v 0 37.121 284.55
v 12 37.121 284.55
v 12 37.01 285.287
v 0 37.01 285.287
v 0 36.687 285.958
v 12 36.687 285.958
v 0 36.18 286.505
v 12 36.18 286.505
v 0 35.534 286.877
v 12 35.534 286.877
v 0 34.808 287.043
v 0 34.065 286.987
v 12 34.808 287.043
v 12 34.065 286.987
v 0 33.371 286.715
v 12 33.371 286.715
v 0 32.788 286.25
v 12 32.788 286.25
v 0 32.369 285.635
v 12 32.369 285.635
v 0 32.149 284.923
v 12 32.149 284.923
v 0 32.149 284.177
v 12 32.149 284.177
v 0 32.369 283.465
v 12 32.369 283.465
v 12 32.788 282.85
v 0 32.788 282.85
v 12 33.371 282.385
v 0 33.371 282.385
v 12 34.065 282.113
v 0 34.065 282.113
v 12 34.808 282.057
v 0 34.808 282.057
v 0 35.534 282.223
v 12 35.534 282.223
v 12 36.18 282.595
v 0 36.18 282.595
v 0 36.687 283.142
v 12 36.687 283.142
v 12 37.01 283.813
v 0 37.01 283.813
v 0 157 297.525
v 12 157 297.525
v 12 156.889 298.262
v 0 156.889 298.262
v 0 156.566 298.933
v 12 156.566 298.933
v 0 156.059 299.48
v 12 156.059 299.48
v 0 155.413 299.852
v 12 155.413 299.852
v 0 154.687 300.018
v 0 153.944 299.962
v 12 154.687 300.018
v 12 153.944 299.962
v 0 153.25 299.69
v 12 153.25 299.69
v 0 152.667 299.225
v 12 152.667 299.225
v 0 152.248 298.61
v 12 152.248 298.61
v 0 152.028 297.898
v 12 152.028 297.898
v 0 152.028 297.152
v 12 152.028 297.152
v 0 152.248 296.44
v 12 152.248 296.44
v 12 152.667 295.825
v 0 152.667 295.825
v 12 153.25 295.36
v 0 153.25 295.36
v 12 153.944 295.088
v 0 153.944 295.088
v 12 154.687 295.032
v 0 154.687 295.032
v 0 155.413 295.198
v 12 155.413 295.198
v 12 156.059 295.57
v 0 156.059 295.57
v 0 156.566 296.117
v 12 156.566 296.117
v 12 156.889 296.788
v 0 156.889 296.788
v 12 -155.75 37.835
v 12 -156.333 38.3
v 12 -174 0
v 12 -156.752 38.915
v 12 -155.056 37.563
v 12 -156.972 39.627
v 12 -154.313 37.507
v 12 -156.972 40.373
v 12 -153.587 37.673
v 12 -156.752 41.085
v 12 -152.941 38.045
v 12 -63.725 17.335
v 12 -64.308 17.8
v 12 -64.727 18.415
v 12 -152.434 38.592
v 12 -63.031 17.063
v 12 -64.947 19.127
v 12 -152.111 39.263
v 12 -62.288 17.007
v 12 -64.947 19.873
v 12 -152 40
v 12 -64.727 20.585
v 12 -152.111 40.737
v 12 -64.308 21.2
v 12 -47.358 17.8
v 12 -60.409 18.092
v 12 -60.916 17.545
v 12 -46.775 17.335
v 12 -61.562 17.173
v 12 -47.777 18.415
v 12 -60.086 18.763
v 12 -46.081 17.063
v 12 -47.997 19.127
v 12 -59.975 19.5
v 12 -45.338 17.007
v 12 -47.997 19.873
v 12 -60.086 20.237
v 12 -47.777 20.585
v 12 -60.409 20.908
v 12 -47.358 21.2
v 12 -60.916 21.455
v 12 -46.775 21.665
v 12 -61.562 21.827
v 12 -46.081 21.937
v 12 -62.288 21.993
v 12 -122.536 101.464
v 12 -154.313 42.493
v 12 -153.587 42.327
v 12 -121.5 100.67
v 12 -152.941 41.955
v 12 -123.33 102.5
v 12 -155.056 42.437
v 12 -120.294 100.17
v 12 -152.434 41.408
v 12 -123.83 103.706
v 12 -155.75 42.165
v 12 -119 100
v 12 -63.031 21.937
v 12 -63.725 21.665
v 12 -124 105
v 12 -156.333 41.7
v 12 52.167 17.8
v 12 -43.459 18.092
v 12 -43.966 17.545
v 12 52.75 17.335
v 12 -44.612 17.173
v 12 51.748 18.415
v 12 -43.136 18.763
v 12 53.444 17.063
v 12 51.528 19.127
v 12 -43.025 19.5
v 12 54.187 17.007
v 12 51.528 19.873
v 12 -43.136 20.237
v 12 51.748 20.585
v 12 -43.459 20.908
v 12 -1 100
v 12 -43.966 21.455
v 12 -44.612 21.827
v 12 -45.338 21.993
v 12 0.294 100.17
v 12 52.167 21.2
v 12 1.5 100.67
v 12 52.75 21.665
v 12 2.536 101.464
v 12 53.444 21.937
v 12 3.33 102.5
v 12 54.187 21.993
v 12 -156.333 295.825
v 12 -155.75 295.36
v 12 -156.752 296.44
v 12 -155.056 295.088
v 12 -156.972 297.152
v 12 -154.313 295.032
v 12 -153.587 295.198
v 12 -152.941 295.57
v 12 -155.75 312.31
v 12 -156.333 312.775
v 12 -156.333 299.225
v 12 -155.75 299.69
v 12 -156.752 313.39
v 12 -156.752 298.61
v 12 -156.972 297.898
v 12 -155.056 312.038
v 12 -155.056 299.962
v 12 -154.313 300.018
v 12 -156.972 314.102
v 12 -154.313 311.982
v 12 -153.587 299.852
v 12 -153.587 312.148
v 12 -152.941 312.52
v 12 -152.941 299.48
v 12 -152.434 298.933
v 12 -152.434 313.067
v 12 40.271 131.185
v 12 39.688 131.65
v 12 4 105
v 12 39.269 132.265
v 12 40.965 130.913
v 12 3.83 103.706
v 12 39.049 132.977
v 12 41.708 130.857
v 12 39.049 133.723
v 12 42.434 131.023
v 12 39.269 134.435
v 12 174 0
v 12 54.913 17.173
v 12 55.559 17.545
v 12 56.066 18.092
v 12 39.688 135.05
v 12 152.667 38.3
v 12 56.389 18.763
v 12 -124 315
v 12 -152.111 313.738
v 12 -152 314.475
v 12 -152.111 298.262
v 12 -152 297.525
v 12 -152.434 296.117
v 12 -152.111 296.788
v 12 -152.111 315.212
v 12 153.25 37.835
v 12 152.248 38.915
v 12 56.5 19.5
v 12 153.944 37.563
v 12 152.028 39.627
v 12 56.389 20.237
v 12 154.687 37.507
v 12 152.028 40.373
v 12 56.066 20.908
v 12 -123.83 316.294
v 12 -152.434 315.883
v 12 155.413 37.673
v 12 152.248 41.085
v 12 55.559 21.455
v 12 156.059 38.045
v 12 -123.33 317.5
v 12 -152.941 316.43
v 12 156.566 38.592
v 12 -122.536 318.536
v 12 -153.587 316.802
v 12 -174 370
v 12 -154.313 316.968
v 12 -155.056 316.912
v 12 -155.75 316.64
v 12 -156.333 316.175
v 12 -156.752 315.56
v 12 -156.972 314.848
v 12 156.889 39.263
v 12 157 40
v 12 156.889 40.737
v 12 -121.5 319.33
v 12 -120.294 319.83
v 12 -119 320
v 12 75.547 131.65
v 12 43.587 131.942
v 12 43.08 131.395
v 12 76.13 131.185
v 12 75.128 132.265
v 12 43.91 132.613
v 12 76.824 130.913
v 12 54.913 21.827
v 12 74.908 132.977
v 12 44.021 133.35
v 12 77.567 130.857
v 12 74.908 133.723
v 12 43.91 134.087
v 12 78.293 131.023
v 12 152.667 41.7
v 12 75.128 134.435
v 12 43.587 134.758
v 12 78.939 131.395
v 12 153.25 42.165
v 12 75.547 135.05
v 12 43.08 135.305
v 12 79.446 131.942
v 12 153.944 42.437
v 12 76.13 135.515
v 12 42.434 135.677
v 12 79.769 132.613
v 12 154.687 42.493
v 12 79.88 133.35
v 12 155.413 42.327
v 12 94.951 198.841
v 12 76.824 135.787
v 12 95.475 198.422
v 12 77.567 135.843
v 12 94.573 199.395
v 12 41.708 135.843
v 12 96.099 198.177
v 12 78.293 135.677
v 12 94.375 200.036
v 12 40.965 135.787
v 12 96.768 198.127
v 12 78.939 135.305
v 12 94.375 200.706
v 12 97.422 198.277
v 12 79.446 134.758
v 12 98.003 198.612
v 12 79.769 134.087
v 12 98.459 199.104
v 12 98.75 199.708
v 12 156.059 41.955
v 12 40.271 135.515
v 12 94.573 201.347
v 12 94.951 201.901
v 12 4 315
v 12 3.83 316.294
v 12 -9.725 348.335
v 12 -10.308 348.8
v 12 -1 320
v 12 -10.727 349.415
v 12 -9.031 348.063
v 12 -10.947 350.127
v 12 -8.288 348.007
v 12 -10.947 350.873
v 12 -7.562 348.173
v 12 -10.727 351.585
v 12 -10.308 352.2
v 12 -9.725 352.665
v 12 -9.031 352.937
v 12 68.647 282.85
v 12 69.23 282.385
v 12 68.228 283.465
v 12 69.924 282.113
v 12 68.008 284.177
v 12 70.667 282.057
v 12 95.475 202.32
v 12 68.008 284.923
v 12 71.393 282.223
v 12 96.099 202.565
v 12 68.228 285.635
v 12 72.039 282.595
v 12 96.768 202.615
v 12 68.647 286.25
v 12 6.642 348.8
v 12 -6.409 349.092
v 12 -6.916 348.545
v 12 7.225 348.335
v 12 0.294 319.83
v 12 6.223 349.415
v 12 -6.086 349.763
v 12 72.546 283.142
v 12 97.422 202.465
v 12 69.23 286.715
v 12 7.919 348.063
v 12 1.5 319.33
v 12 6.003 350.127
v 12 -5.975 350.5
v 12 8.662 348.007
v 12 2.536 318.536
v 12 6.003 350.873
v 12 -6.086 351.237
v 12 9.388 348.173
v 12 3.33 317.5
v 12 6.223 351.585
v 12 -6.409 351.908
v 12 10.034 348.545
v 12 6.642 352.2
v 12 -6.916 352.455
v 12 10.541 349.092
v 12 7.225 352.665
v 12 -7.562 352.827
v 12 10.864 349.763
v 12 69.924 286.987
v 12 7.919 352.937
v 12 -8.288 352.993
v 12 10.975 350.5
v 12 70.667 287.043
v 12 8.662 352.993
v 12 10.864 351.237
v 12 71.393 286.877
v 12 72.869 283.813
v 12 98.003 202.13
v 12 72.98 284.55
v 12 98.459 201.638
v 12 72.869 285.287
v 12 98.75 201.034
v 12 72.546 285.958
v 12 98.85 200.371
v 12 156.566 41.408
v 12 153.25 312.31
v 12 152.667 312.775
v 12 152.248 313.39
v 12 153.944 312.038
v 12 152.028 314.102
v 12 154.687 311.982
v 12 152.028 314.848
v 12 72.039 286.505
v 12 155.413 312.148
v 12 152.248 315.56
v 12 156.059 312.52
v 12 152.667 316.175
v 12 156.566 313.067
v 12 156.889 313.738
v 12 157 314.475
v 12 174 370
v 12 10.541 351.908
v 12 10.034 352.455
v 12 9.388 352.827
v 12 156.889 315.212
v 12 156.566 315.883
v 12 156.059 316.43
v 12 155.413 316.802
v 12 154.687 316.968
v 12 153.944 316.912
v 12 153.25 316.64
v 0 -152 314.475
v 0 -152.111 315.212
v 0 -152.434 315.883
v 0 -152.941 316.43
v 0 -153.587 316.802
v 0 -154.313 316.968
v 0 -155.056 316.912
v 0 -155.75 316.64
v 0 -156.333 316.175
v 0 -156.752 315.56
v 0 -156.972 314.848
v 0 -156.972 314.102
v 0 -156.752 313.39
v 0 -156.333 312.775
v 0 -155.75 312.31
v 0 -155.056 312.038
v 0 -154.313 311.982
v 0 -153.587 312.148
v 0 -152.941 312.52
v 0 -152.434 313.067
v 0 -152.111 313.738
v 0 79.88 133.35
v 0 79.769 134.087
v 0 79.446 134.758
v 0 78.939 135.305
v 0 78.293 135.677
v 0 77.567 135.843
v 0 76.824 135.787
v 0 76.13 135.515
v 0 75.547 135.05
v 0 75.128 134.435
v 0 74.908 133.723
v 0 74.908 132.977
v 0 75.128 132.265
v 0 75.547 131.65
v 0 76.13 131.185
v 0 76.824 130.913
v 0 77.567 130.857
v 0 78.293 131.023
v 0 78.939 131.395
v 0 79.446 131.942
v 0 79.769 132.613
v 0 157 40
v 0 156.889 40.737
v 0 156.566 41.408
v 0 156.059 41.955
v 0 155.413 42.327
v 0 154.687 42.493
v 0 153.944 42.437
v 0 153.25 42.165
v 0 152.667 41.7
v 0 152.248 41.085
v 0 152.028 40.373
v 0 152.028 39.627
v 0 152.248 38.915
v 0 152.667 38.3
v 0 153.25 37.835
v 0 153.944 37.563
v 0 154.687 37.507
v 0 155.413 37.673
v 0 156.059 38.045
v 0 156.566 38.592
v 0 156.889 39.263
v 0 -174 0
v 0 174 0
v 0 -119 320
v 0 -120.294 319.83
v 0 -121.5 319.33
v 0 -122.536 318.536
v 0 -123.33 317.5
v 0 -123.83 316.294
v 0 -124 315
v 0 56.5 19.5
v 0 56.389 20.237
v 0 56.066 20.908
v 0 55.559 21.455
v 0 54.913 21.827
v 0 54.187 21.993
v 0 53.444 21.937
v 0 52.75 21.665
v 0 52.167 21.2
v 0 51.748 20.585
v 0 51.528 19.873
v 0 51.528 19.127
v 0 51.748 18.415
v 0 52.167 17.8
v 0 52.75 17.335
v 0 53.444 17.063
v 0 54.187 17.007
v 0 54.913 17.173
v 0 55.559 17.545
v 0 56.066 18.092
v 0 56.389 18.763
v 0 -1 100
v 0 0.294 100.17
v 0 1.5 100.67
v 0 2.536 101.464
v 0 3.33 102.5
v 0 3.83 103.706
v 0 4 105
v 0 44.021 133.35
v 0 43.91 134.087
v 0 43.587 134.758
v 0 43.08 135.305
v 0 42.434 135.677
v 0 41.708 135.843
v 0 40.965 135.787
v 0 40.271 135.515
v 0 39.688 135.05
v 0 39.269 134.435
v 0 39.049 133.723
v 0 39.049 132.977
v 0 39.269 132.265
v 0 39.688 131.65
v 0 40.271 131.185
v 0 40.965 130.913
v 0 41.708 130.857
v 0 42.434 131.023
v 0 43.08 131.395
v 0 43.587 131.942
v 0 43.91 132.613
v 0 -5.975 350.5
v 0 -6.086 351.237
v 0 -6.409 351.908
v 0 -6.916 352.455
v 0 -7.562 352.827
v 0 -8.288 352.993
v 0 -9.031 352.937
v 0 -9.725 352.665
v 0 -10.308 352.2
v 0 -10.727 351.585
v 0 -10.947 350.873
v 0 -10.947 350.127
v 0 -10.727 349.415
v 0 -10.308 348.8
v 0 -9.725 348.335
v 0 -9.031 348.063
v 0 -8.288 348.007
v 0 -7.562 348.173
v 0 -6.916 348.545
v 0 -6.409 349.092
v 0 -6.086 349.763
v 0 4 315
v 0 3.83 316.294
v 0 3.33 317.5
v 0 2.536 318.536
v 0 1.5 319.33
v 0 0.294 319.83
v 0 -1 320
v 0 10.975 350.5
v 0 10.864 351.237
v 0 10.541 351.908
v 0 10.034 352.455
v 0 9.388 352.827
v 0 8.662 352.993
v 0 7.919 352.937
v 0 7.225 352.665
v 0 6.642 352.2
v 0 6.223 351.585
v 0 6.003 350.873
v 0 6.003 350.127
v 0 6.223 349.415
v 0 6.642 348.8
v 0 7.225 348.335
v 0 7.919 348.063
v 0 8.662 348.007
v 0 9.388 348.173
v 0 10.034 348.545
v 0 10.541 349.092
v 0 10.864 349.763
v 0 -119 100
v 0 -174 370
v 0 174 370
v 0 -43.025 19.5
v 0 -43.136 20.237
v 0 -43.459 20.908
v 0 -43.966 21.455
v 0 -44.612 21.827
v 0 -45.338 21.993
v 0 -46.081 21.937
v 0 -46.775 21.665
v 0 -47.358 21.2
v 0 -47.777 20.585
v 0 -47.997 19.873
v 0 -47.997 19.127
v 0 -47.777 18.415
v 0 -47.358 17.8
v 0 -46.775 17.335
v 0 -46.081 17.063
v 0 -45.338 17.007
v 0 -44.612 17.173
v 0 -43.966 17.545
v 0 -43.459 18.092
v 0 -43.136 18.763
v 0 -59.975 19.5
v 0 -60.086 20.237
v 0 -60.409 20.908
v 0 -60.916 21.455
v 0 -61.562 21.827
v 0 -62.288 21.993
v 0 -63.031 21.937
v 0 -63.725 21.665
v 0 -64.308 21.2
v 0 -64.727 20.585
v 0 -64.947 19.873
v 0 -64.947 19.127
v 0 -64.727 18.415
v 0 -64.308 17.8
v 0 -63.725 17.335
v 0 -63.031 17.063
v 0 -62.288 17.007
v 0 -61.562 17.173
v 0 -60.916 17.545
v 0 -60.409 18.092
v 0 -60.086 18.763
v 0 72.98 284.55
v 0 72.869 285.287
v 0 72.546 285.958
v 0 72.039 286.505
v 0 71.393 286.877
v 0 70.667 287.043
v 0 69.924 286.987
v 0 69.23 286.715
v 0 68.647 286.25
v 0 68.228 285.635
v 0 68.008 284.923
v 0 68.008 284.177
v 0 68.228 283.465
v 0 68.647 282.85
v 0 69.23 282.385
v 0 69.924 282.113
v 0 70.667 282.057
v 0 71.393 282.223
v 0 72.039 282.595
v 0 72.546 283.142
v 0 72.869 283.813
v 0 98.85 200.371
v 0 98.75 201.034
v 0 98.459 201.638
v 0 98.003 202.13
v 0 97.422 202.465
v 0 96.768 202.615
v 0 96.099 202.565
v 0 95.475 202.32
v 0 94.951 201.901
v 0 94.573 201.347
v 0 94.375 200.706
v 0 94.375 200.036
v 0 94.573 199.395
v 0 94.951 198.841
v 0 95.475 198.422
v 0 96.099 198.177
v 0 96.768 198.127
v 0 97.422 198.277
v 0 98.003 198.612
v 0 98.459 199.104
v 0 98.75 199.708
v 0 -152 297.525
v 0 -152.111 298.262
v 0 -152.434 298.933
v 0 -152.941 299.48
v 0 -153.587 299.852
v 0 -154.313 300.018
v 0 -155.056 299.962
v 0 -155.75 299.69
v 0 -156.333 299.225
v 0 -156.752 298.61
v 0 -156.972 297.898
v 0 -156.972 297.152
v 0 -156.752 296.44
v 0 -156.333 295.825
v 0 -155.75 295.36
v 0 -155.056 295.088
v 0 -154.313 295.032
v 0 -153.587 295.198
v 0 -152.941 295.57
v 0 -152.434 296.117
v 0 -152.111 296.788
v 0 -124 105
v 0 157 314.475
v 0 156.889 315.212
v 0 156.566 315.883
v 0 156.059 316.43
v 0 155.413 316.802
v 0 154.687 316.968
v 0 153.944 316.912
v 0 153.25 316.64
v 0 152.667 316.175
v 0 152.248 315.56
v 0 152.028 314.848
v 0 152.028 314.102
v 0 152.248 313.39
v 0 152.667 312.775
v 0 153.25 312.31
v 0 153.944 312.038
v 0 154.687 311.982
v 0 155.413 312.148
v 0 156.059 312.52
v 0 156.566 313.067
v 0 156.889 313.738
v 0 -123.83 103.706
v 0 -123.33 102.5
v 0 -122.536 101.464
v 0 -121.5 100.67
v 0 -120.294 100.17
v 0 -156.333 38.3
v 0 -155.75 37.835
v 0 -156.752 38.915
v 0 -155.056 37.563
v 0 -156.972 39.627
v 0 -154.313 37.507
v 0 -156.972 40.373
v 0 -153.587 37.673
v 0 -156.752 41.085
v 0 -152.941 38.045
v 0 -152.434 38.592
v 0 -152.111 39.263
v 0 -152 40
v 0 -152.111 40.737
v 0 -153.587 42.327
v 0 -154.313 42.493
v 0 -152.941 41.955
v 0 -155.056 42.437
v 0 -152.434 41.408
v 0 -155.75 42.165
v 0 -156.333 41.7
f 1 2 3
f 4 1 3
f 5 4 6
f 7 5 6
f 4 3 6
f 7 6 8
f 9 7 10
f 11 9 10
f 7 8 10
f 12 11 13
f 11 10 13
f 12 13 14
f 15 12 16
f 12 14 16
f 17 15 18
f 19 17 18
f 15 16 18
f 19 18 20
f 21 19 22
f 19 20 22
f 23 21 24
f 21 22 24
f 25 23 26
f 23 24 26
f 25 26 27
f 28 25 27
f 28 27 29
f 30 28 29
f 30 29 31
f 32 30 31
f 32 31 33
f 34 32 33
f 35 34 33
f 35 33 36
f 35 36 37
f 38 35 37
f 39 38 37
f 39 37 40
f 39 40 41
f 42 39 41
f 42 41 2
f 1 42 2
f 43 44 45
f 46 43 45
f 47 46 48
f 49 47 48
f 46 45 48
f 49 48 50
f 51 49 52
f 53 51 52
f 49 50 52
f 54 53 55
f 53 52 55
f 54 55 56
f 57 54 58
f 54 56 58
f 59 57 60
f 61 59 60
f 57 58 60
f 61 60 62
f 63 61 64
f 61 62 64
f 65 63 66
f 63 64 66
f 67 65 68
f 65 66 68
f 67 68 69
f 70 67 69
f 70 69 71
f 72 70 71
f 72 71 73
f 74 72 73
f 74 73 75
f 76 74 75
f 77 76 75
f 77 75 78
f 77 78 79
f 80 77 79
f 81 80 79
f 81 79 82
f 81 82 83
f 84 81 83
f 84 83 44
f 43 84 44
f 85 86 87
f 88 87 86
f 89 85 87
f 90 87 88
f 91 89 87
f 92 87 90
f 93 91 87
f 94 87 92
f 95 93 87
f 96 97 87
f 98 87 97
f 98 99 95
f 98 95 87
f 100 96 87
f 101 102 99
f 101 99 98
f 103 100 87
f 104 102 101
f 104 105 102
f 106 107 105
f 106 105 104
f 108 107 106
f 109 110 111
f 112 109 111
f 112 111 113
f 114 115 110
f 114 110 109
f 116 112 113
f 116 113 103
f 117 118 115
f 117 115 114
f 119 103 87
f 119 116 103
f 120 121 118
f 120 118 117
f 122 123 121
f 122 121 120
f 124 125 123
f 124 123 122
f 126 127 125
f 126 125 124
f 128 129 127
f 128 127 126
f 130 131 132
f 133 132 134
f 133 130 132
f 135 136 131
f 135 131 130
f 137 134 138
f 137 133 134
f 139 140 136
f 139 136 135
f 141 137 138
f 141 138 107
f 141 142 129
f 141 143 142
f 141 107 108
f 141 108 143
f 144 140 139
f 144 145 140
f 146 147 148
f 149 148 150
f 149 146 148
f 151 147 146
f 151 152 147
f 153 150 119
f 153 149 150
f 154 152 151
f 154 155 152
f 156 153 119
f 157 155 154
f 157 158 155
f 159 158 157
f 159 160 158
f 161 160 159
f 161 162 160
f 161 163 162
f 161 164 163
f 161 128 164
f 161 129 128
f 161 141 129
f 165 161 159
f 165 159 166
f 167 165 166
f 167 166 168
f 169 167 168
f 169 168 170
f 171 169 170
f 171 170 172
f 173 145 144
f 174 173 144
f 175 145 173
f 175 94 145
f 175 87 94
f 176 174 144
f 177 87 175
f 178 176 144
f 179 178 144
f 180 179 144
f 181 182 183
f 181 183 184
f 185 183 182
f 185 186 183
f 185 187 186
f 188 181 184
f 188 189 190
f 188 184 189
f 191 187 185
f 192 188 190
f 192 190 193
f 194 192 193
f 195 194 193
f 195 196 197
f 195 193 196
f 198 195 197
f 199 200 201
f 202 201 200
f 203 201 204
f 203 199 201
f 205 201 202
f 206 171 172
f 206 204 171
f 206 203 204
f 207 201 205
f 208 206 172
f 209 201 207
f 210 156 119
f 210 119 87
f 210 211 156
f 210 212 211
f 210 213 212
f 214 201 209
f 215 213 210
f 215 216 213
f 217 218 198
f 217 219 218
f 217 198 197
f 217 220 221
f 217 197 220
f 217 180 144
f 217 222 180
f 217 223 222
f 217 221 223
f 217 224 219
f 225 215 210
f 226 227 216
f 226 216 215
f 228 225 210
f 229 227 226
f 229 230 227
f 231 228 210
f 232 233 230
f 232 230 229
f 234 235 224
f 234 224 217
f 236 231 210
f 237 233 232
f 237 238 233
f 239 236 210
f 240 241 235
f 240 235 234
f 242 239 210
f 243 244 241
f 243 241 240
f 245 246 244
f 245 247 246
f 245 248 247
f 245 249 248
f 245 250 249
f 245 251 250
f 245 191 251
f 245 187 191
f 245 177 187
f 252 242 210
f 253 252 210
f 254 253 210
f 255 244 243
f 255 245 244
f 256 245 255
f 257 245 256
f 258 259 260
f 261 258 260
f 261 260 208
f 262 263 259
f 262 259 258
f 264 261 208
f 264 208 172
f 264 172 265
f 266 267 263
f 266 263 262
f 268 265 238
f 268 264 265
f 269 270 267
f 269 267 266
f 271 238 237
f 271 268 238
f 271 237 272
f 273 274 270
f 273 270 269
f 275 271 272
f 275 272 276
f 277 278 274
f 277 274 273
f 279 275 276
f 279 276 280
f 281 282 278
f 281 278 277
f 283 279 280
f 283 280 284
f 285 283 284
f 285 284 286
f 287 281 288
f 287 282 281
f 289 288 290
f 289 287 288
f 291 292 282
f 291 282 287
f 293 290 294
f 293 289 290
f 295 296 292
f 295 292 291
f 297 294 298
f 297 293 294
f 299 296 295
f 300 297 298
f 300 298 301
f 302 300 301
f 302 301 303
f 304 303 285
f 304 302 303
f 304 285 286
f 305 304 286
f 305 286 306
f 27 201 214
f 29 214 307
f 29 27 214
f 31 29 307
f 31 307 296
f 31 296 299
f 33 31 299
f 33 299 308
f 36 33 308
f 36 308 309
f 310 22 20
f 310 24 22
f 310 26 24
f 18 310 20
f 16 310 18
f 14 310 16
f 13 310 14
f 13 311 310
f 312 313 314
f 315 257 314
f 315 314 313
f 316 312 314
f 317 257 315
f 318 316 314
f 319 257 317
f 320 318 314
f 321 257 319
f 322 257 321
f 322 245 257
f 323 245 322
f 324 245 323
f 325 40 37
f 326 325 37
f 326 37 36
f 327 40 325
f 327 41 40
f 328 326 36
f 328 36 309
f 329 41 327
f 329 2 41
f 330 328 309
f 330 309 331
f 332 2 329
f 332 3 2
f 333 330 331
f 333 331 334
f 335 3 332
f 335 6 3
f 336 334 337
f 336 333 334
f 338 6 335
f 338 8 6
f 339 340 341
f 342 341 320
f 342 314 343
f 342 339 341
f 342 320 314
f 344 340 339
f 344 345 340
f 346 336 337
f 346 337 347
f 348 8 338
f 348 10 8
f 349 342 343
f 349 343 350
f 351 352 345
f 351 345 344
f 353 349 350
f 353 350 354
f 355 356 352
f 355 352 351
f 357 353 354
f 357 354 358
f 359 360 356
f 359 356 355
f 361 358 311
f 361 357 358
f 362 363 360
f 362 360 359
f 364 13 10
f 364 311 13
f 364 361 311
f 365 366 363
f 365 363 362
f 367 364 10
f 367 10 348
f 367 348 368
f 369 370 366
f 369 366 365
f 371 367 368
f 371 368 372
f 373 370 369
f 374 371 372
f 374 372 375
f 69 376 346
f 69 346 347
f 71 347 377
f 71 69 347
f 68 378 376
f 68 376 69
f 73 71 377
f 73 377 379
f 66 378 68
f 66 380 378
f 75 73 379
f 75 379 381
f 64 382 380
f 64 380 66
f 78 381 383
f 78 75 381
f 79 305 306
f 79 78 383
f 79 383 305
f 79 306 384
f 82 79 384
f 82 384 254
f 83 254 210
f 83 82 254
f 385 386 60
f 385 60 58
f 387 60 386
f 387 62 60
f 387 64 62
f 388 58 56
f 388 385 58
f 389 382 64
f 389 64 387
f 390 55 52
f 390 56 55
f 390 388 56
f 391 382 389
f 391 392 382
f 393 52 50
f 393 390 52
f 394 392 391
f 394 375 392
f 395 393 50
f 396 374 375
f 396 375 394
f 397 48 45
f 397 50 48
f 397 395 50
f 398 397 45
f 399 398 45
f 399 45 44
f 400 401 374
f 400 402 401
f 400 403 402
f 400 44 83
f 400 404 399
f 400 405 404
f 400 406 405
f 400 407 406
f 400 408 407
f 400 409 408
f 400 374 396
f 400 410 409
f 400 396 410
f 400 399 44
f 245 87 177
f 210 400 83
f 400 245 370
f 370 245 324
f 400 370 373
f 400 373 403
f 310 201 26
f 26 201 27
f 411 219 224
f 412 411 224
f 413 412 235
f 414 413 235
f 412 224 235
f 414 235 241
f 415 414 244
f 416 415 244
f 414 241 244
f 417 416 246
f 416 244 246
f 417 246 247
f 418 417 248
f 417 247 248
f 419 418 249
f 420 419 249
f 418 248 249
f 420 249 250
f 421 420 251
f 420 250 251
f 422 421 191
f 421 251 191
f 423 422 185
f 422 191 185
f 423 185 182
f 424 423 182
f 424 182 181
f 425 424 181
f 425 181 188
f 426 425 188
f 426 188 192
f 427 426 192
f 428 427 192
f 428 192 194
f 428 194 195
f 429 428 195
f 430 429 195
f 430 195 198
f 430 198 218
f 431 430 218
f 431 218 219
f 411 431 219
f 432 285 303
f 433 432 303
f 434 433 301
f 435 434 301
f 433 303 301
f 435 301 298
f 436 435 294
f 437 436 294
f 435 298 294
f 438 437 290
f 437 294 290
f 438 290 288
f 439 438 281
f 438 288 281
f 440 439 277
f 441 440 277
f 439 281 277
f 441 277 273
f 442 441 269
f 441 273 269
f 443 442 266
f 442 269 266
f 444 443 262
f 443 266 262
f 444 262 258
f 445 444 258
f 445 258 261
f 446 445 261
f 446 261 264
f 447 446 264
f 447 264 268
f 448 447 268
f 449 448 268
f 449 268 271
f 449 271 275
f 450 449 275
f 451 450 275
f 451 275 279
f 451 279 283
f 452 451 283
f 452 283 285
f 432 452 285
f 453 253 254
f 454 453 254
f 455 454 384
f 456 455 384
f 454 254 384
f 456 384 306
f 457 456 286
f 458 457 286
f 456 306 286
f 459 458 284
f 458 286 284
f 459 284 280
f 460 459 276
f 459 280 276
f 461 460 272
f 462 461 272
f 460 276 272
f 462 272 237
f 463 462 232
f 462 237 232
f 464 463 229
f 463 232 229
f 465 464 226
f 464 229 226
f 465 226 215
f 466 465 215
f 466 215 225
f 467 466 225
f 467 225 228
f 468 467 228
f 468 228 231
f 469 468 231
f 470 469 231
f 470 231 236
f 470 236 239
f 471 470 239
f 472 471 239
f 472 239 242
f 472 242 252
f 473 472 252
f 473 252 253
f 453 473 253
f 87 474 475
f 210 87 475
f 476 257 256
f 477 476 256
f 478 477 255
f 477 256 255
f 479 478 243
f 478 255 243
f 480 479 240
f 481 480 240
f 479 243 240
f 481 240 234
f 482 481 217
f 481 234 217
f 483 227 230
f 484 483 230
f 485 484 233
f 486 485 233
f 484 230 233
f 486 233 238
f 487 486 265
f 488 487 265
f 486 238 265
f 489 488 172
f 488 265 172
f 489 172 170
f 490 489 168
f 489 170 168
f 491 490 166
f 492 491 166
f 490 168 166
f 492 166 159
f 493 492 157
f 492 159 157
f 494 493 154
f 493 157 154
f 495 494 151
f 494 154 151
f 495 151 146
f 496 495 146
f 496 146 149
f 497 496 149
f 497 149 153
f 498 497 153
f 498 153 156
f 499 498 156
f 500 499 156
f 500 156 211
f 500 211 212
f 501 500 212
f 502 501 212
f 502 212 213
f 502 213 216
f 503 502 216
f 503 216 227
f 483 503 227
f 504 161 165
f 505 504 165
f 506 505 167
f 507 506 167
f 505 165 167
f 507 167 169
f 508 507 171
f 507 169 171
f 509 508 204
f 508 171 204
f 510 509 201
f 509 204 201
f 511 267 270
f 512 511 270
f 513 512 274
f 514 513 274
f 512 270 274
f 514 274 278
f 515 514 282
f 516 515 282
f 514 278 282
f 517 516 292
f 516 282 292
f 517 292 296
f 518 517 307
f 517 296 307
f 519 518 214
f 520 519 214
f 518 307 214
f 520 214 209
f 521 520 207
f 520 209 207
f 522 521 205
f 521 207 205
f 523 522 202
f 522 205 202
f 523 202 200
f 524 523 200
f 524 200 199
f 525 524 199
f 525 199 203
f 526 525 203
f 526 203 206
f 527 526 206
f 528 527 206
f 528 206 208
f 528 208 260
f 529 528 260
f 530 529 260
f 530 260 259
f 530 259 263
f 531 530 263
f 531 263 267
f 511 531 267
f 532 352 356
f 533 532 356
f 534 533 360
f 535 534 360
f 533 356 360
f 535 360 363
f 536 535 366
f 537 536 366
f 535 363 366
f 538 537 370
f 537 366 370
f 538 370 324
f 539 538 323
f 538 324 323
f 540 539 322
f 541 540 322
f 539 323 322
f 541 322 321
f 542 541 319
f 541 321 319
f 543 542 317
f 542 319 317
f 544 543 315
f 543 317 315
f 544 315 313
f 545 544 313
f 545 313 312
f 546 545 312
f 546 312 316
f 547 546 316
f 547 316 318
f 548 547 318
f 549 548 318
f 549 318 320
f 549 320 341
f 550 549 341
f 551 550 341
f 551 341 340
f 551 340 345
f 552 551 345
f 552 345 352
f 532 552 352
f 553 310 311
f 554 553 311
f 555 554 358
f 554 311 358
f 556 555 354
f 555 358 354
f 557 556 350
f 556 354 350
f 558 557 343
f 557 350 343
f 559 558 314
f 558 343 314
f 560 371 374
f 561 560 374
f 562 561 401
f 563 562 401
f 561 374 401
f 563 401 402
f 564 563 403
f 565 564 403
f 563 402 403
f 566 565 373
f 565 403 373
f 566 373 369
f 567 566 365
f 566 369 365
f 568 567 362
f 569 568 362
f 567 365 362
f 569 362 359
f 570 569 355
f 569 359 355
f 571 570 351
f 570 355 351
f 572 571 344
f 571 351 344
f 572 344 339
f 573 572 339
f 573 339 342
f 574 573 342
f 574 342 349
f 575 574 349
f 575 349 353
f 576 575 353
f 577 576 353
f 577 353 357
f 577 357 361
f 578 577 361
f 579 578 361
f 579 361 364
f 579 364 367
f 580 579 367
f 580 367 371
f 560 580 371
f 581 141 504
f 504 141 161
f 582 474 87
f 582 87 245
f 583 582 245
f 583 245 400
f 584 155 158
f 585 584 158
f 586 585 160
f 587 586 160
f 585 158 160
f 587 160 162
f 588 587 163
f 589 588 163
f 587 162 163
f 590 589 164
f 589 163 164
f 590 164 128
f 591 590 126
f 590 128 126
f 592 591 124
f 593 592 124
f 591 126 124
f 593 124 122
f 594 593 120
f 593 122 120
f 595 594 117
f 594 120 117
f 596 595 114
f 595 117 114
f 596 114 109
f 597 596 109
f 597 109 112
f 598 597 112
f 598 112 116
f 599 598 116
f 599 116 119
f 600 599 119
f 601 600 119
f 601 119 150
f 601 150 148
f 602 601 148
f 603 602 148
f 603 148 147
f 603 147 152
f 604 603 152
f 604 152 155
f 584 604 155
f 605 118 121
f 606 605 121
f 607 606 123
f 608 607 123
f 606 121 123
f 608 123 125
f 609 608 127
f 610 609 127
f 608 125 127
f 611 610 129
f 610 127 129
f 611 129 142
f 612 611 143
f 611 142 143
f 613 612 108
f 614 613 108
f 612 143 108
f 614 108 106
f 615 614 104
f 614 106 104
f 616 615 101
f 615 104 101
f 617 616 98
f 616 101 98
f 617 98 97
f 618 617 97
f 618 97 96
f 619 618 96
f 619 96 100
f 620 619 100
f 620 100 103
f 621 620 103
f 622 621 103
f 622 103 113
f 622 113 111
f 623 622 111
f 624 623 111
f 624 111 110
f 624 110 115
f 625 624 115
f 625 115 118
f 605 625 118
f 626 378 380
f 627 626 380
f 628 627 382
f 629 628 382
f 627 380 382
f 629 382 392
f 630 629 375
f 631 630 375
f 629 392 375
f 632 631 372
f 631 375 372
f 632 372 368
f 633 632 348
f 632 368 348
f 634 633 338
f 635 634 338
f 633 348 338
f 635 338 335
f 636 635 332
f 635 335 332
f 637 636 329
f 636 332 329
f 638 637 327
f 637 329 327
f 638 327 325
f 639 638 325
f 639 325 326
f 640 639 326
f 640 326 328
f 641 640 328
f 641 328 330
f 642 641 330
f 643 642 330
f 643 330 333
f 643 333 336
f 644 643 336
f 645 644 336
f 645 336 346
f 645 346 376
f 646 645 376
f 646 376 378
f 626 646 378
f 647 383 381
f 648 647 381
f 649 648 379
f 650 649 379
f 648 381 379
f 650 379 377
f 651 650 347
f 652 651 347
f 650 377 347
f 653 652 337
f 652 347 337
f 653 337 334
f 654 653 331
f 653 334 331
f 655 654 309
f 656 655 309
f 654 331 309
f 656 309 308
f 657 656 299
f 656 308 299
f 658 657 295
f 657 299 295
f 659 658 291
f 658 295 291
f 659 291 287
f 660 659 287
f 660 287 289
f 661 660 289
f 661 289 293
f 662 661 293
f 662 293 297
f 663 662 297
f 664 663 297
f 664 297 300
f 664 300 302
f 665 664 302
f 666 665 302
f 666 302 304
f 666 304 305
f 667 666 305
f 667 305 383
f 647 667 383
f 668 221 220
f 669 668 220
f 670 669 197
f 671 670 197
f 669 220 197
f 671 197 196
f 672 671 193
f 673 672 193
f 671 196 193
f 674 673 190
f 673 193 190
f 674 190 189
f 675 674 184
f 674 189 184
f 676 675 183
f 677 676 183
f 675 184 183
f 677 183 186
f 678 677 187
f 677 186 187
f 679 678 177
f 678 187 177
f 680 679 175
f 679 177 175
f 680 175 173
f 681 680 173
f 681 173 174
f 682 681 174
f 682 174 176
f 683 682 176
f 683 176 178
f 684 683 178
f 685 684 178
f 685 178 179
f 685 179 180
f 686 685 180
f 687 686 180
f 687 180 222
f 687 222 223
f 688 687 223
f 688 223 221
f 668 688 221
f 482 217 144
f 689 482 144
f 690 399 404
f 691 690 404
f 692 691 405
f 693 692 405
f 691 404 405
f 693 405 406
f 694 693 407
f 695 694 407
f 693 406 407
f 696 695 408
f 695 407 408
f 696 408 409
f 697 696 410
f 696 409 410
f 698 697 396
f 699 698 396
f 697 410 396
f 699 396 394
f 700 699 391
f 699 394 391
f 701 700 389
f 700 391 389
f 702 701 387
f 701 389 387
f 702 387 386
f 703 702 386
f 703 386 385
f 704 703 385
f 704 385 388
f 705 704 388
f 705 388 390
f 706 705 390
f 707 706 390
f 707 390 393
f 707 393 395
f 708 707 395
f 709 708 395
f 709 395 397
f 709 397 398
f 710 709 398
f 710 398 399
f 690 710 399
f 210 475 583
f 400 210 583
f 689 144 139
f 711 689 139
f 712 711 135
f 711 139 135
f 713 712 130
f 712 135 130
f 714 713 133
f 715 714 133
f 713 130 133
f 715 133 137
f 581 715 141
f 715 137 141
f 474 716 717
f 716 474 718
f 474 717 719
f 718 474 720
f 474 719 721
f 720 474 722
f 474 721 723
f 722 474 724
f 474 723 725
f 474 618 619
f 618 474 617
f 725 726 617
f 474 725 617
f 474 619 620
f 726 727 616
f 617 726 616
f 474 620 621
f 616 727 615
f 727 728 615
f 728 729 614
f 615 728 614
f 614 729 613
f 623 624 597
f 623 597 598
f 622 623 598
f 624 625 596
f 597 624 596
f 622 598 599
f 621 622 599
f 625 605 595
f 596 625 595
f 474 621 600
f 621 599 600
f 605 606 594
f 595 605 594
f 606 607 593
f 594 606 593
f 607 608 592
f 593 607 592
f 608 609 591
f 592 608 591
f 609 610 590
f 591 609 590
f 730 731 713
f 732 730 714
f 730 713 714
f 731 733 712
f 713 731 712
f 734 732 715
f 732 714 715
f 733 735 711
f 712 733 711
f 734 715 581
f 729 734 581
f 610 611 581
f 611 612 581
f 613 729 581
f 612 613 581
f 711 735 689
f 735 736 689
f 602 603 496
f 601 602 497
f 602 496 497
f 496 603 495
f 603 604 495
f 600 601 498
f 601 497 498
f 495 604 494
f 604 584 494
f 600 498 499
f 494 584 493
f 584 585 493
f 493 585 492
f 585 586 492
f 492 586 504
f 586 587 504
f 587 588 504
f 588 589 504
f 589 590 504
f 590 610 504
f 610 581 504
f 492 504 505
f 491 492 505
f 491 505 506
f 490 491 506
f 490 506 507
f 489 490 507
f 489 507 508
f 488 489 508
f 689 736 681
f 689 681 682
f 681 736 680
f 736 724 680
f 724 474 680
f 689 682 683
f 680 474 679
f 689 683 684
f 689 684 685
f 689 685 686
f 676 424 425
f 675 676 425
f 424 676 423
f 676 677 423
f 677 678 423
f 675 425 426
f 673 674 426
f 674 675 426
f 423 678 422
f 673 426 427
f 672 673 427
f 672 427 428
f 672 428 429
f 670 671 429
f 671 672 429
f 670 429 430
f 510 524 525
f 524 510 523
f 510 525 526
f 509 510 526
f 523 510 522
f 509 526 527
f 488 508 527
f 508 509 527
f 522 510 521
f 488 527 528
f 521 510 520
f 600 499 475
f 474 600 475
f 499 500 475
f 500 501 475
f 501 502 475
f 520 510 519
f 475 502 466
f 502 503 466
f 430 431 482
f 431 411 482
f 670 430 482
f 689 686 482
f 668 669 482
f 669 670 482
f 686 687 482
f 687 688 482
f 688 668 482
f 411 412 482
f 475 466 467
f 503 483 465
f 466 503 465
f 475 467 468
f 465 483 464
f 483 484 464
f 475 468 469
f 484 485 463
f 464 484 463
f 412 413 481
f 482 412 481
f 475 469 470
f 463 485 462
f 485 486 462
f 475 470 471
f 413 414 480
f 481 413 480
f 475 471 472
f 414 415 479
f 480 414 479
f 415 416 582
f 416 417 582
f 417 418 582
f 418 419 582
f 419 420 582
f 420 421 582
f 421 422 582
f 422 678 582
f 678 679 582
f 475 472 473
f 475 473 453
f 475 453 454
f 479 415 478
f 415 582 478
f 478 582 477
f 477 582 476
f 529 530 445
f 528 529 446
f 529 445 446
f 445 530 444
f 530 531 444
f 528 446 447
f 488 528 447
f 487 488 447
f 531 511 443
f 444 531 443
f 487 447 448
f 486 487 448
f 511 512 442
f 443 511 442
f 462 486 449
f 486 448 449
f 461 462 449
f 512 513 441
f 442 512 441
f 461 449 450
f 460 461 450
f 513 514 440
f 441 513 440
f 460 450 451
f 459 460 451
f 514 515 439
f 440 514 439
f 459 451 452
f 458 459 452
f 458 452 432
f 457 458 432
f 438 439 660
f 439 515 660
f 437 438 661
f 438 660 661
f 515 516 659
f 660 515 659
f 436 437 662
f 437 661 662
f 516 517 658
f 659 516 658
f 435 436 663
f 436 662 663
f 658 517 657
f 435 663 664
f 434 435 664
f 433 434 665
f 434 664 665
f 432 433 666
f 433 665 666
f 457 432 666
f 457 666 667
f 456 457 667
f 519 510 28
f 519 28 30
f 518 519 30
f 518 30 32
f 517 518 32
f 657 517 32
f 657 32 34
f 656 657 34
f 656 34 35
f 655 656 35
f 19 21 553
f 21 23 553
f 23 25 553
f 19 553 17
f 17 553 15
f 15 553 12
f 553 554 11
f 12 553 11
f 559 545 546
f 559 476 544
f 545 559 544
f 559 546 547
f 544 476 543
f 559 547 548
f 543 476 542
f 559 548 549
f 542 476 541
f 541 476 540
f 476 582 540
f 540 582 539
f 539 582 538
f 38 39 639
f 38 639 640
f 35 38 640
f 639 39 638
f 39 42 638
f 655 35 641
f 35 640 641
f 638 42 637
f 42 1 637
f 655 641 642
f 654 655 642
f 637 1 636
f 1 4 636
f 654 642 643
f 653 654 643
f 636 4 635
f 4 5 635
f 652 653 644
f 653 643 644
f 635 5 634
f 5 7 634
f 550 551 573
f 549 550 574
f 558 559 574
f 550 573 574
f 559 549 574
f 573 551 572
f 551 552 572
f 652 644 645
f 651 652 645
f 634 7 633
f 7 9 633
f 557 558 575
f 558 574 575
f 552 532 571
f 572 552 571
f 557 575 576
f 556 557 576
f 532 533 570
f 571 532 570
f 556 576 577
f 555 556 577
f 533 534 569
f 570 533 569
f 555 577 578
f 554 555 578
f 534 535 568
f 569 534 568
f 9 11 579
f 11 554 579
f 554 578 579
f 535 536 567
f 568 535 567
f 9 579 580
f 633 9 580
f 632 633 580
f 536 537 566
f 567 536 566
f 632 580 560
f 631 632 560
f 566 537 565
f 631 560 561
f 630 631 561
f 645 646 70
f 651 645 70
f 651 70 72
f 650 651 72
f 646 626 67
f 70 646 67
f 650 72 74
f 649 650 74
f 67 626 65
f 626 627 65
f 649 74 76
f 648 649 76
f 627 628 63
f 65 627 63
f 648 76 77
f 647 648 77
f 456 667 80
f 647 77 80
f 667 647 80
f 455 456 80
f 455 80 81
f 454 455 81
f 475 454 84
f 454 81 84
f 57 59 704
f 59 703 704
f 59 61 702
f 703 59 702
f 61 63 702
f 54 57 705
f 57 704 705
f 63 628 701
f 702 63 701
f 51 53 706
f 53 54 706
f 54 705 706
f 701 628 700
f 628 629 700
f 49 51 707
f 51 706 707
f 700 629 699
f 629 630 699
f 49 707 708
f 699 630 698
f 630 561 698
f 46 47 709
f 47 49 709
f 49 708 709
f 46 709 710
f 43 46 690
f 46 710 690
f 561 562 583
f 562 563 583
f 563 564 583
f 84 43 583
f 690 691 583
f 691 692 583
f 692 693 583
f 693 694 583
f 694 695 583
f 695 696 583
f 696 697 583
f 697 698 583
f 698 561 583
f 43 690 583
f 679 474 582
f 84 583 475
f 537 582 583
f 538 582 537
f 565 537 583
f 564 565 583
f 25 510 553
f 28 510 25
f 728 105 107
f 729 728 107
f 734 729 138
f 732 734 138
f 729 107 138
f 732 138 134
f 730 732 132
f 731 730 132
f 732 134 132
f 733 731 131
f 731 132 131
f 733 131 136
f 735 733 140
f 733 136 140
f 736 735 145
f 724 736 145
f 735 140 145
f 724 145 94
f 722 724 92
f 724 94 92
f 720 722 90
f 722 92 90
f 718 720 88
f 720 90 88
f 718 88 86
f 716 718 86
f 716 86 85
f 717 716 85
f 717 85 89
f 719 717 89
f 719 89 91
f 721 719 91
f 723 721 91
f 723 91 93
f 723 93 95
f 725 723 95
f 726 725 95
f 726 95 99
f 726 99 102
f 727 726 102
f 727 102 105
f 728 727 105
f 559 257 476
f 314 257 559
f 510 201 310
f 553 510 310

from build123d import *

# Parameters (mm, degrees)
SKETCH_W        = 348
SKETCH_H        = 370
PAD_DEPTH       = 12
POCKET_DEPTH    = 12.001
SKETCH002_R     = 2.5
POCKET001_DEPTH = 12.001
SKETCH003_R     = 2.5
SKETCH003_R_2   = 2.25
POCKET002_DEPTH = 12.001


with BuildPart() as part:
    # Sketch → Pad (new body)
    with BuildSketch(Plane.YZ):
        with Locations((0, 185)):
            Rectangle(SKETCH_W, SKETCH_H)
    extrude(amount=PAD_DEPTH)

    # Sketch001 → Pocket (cut, through all)
    with BuildSketch(Plane.YZ.offset(12)):
        with BuildLine():
            Line((-124, 314.999997), (-124, 105.000005))
            ThreePointArc((-124, 105.000005), (-122.535546, 101.464478), (-119.000029, 100))
            Line((-119.000029, 100), (-1.000005, 100))
            ThreePointArc((-1.000005, 100), (2.535534, 101.464466), (4, 105.000005))
            Line((4, 105.000005), (4, 314.999997))
            ThreePointArc((4, 314.999997), (2.535534, 318.535534), (-1.000004, 320))
            Line((-119.000028, 320), (-1.000004, 320))
            ThreePointArc((-119.000028, 320), (-122.535545, 318.535523), (-124, 314.999997))
        make_face()
    extrude(amount=-POCKET_DEPTH, mode=Mode.SUBTRACT)

    # Sketch002 → Pocket001 (cut, through all)
    with BuildSketch(Plane.YZ.offset(12)):
        with Locations((-154.5, 314.475)):
            Circle(SKETCH002_R)
        with Locations((-154.5, 40)):
            Circle(SKETCH002_R)
        with Locations((-62.475, 19.5)):
            Circle(SKETCH002_R)
        with Locations((-8.475, 350.5)):
            Circle(SKETCH002_R)
        with Locations((-154.5, 297.525)):
            Circle(SKETCH002_R)
        with Locations((-45.525, 19.5)):
            Circle(SKETCH002_R)
        with Locations((154.5, 314.475)):
            Circle(SKETCH002_R)
        with Locations((154.5, 297.525)):
            Circle(SKETCH002_R)
        with Locations((154.5, 40)):
            Circle(SKETCH002_R)
        with Locations((54, 19.5)):
            Circle(SKETCH002_R)
        with Locations((8.475, 350.5)):
            Circle(SKETCH002_R)
    extrude(amount=-POCKET001_DEPTH, mode=Mode.SUBTRACT)

    # Sketch003 → Pocket002 (cut, through all)
    with BuildSketch(Plane.YZ.offset(12)):
        with Locations((41.521, 133.35)):
            Circle(SKETCH003_R)
        with Locations((77.38, 133.35)):
            Circle(SKETCH003_R)
        with Locations((34.621, 284.55)):
            Circle(SKETCH003_R)
        with Locations((70.48, 284.55)):
            Circle(SKETCH003_R)
        with Locations((96.6, 200.371)):
            Circle(SKETCH003_R_2)
    extrude(amount=-POCKET002_DEPTH, mode=Mode.SUBTRACT)


solid = part.part
